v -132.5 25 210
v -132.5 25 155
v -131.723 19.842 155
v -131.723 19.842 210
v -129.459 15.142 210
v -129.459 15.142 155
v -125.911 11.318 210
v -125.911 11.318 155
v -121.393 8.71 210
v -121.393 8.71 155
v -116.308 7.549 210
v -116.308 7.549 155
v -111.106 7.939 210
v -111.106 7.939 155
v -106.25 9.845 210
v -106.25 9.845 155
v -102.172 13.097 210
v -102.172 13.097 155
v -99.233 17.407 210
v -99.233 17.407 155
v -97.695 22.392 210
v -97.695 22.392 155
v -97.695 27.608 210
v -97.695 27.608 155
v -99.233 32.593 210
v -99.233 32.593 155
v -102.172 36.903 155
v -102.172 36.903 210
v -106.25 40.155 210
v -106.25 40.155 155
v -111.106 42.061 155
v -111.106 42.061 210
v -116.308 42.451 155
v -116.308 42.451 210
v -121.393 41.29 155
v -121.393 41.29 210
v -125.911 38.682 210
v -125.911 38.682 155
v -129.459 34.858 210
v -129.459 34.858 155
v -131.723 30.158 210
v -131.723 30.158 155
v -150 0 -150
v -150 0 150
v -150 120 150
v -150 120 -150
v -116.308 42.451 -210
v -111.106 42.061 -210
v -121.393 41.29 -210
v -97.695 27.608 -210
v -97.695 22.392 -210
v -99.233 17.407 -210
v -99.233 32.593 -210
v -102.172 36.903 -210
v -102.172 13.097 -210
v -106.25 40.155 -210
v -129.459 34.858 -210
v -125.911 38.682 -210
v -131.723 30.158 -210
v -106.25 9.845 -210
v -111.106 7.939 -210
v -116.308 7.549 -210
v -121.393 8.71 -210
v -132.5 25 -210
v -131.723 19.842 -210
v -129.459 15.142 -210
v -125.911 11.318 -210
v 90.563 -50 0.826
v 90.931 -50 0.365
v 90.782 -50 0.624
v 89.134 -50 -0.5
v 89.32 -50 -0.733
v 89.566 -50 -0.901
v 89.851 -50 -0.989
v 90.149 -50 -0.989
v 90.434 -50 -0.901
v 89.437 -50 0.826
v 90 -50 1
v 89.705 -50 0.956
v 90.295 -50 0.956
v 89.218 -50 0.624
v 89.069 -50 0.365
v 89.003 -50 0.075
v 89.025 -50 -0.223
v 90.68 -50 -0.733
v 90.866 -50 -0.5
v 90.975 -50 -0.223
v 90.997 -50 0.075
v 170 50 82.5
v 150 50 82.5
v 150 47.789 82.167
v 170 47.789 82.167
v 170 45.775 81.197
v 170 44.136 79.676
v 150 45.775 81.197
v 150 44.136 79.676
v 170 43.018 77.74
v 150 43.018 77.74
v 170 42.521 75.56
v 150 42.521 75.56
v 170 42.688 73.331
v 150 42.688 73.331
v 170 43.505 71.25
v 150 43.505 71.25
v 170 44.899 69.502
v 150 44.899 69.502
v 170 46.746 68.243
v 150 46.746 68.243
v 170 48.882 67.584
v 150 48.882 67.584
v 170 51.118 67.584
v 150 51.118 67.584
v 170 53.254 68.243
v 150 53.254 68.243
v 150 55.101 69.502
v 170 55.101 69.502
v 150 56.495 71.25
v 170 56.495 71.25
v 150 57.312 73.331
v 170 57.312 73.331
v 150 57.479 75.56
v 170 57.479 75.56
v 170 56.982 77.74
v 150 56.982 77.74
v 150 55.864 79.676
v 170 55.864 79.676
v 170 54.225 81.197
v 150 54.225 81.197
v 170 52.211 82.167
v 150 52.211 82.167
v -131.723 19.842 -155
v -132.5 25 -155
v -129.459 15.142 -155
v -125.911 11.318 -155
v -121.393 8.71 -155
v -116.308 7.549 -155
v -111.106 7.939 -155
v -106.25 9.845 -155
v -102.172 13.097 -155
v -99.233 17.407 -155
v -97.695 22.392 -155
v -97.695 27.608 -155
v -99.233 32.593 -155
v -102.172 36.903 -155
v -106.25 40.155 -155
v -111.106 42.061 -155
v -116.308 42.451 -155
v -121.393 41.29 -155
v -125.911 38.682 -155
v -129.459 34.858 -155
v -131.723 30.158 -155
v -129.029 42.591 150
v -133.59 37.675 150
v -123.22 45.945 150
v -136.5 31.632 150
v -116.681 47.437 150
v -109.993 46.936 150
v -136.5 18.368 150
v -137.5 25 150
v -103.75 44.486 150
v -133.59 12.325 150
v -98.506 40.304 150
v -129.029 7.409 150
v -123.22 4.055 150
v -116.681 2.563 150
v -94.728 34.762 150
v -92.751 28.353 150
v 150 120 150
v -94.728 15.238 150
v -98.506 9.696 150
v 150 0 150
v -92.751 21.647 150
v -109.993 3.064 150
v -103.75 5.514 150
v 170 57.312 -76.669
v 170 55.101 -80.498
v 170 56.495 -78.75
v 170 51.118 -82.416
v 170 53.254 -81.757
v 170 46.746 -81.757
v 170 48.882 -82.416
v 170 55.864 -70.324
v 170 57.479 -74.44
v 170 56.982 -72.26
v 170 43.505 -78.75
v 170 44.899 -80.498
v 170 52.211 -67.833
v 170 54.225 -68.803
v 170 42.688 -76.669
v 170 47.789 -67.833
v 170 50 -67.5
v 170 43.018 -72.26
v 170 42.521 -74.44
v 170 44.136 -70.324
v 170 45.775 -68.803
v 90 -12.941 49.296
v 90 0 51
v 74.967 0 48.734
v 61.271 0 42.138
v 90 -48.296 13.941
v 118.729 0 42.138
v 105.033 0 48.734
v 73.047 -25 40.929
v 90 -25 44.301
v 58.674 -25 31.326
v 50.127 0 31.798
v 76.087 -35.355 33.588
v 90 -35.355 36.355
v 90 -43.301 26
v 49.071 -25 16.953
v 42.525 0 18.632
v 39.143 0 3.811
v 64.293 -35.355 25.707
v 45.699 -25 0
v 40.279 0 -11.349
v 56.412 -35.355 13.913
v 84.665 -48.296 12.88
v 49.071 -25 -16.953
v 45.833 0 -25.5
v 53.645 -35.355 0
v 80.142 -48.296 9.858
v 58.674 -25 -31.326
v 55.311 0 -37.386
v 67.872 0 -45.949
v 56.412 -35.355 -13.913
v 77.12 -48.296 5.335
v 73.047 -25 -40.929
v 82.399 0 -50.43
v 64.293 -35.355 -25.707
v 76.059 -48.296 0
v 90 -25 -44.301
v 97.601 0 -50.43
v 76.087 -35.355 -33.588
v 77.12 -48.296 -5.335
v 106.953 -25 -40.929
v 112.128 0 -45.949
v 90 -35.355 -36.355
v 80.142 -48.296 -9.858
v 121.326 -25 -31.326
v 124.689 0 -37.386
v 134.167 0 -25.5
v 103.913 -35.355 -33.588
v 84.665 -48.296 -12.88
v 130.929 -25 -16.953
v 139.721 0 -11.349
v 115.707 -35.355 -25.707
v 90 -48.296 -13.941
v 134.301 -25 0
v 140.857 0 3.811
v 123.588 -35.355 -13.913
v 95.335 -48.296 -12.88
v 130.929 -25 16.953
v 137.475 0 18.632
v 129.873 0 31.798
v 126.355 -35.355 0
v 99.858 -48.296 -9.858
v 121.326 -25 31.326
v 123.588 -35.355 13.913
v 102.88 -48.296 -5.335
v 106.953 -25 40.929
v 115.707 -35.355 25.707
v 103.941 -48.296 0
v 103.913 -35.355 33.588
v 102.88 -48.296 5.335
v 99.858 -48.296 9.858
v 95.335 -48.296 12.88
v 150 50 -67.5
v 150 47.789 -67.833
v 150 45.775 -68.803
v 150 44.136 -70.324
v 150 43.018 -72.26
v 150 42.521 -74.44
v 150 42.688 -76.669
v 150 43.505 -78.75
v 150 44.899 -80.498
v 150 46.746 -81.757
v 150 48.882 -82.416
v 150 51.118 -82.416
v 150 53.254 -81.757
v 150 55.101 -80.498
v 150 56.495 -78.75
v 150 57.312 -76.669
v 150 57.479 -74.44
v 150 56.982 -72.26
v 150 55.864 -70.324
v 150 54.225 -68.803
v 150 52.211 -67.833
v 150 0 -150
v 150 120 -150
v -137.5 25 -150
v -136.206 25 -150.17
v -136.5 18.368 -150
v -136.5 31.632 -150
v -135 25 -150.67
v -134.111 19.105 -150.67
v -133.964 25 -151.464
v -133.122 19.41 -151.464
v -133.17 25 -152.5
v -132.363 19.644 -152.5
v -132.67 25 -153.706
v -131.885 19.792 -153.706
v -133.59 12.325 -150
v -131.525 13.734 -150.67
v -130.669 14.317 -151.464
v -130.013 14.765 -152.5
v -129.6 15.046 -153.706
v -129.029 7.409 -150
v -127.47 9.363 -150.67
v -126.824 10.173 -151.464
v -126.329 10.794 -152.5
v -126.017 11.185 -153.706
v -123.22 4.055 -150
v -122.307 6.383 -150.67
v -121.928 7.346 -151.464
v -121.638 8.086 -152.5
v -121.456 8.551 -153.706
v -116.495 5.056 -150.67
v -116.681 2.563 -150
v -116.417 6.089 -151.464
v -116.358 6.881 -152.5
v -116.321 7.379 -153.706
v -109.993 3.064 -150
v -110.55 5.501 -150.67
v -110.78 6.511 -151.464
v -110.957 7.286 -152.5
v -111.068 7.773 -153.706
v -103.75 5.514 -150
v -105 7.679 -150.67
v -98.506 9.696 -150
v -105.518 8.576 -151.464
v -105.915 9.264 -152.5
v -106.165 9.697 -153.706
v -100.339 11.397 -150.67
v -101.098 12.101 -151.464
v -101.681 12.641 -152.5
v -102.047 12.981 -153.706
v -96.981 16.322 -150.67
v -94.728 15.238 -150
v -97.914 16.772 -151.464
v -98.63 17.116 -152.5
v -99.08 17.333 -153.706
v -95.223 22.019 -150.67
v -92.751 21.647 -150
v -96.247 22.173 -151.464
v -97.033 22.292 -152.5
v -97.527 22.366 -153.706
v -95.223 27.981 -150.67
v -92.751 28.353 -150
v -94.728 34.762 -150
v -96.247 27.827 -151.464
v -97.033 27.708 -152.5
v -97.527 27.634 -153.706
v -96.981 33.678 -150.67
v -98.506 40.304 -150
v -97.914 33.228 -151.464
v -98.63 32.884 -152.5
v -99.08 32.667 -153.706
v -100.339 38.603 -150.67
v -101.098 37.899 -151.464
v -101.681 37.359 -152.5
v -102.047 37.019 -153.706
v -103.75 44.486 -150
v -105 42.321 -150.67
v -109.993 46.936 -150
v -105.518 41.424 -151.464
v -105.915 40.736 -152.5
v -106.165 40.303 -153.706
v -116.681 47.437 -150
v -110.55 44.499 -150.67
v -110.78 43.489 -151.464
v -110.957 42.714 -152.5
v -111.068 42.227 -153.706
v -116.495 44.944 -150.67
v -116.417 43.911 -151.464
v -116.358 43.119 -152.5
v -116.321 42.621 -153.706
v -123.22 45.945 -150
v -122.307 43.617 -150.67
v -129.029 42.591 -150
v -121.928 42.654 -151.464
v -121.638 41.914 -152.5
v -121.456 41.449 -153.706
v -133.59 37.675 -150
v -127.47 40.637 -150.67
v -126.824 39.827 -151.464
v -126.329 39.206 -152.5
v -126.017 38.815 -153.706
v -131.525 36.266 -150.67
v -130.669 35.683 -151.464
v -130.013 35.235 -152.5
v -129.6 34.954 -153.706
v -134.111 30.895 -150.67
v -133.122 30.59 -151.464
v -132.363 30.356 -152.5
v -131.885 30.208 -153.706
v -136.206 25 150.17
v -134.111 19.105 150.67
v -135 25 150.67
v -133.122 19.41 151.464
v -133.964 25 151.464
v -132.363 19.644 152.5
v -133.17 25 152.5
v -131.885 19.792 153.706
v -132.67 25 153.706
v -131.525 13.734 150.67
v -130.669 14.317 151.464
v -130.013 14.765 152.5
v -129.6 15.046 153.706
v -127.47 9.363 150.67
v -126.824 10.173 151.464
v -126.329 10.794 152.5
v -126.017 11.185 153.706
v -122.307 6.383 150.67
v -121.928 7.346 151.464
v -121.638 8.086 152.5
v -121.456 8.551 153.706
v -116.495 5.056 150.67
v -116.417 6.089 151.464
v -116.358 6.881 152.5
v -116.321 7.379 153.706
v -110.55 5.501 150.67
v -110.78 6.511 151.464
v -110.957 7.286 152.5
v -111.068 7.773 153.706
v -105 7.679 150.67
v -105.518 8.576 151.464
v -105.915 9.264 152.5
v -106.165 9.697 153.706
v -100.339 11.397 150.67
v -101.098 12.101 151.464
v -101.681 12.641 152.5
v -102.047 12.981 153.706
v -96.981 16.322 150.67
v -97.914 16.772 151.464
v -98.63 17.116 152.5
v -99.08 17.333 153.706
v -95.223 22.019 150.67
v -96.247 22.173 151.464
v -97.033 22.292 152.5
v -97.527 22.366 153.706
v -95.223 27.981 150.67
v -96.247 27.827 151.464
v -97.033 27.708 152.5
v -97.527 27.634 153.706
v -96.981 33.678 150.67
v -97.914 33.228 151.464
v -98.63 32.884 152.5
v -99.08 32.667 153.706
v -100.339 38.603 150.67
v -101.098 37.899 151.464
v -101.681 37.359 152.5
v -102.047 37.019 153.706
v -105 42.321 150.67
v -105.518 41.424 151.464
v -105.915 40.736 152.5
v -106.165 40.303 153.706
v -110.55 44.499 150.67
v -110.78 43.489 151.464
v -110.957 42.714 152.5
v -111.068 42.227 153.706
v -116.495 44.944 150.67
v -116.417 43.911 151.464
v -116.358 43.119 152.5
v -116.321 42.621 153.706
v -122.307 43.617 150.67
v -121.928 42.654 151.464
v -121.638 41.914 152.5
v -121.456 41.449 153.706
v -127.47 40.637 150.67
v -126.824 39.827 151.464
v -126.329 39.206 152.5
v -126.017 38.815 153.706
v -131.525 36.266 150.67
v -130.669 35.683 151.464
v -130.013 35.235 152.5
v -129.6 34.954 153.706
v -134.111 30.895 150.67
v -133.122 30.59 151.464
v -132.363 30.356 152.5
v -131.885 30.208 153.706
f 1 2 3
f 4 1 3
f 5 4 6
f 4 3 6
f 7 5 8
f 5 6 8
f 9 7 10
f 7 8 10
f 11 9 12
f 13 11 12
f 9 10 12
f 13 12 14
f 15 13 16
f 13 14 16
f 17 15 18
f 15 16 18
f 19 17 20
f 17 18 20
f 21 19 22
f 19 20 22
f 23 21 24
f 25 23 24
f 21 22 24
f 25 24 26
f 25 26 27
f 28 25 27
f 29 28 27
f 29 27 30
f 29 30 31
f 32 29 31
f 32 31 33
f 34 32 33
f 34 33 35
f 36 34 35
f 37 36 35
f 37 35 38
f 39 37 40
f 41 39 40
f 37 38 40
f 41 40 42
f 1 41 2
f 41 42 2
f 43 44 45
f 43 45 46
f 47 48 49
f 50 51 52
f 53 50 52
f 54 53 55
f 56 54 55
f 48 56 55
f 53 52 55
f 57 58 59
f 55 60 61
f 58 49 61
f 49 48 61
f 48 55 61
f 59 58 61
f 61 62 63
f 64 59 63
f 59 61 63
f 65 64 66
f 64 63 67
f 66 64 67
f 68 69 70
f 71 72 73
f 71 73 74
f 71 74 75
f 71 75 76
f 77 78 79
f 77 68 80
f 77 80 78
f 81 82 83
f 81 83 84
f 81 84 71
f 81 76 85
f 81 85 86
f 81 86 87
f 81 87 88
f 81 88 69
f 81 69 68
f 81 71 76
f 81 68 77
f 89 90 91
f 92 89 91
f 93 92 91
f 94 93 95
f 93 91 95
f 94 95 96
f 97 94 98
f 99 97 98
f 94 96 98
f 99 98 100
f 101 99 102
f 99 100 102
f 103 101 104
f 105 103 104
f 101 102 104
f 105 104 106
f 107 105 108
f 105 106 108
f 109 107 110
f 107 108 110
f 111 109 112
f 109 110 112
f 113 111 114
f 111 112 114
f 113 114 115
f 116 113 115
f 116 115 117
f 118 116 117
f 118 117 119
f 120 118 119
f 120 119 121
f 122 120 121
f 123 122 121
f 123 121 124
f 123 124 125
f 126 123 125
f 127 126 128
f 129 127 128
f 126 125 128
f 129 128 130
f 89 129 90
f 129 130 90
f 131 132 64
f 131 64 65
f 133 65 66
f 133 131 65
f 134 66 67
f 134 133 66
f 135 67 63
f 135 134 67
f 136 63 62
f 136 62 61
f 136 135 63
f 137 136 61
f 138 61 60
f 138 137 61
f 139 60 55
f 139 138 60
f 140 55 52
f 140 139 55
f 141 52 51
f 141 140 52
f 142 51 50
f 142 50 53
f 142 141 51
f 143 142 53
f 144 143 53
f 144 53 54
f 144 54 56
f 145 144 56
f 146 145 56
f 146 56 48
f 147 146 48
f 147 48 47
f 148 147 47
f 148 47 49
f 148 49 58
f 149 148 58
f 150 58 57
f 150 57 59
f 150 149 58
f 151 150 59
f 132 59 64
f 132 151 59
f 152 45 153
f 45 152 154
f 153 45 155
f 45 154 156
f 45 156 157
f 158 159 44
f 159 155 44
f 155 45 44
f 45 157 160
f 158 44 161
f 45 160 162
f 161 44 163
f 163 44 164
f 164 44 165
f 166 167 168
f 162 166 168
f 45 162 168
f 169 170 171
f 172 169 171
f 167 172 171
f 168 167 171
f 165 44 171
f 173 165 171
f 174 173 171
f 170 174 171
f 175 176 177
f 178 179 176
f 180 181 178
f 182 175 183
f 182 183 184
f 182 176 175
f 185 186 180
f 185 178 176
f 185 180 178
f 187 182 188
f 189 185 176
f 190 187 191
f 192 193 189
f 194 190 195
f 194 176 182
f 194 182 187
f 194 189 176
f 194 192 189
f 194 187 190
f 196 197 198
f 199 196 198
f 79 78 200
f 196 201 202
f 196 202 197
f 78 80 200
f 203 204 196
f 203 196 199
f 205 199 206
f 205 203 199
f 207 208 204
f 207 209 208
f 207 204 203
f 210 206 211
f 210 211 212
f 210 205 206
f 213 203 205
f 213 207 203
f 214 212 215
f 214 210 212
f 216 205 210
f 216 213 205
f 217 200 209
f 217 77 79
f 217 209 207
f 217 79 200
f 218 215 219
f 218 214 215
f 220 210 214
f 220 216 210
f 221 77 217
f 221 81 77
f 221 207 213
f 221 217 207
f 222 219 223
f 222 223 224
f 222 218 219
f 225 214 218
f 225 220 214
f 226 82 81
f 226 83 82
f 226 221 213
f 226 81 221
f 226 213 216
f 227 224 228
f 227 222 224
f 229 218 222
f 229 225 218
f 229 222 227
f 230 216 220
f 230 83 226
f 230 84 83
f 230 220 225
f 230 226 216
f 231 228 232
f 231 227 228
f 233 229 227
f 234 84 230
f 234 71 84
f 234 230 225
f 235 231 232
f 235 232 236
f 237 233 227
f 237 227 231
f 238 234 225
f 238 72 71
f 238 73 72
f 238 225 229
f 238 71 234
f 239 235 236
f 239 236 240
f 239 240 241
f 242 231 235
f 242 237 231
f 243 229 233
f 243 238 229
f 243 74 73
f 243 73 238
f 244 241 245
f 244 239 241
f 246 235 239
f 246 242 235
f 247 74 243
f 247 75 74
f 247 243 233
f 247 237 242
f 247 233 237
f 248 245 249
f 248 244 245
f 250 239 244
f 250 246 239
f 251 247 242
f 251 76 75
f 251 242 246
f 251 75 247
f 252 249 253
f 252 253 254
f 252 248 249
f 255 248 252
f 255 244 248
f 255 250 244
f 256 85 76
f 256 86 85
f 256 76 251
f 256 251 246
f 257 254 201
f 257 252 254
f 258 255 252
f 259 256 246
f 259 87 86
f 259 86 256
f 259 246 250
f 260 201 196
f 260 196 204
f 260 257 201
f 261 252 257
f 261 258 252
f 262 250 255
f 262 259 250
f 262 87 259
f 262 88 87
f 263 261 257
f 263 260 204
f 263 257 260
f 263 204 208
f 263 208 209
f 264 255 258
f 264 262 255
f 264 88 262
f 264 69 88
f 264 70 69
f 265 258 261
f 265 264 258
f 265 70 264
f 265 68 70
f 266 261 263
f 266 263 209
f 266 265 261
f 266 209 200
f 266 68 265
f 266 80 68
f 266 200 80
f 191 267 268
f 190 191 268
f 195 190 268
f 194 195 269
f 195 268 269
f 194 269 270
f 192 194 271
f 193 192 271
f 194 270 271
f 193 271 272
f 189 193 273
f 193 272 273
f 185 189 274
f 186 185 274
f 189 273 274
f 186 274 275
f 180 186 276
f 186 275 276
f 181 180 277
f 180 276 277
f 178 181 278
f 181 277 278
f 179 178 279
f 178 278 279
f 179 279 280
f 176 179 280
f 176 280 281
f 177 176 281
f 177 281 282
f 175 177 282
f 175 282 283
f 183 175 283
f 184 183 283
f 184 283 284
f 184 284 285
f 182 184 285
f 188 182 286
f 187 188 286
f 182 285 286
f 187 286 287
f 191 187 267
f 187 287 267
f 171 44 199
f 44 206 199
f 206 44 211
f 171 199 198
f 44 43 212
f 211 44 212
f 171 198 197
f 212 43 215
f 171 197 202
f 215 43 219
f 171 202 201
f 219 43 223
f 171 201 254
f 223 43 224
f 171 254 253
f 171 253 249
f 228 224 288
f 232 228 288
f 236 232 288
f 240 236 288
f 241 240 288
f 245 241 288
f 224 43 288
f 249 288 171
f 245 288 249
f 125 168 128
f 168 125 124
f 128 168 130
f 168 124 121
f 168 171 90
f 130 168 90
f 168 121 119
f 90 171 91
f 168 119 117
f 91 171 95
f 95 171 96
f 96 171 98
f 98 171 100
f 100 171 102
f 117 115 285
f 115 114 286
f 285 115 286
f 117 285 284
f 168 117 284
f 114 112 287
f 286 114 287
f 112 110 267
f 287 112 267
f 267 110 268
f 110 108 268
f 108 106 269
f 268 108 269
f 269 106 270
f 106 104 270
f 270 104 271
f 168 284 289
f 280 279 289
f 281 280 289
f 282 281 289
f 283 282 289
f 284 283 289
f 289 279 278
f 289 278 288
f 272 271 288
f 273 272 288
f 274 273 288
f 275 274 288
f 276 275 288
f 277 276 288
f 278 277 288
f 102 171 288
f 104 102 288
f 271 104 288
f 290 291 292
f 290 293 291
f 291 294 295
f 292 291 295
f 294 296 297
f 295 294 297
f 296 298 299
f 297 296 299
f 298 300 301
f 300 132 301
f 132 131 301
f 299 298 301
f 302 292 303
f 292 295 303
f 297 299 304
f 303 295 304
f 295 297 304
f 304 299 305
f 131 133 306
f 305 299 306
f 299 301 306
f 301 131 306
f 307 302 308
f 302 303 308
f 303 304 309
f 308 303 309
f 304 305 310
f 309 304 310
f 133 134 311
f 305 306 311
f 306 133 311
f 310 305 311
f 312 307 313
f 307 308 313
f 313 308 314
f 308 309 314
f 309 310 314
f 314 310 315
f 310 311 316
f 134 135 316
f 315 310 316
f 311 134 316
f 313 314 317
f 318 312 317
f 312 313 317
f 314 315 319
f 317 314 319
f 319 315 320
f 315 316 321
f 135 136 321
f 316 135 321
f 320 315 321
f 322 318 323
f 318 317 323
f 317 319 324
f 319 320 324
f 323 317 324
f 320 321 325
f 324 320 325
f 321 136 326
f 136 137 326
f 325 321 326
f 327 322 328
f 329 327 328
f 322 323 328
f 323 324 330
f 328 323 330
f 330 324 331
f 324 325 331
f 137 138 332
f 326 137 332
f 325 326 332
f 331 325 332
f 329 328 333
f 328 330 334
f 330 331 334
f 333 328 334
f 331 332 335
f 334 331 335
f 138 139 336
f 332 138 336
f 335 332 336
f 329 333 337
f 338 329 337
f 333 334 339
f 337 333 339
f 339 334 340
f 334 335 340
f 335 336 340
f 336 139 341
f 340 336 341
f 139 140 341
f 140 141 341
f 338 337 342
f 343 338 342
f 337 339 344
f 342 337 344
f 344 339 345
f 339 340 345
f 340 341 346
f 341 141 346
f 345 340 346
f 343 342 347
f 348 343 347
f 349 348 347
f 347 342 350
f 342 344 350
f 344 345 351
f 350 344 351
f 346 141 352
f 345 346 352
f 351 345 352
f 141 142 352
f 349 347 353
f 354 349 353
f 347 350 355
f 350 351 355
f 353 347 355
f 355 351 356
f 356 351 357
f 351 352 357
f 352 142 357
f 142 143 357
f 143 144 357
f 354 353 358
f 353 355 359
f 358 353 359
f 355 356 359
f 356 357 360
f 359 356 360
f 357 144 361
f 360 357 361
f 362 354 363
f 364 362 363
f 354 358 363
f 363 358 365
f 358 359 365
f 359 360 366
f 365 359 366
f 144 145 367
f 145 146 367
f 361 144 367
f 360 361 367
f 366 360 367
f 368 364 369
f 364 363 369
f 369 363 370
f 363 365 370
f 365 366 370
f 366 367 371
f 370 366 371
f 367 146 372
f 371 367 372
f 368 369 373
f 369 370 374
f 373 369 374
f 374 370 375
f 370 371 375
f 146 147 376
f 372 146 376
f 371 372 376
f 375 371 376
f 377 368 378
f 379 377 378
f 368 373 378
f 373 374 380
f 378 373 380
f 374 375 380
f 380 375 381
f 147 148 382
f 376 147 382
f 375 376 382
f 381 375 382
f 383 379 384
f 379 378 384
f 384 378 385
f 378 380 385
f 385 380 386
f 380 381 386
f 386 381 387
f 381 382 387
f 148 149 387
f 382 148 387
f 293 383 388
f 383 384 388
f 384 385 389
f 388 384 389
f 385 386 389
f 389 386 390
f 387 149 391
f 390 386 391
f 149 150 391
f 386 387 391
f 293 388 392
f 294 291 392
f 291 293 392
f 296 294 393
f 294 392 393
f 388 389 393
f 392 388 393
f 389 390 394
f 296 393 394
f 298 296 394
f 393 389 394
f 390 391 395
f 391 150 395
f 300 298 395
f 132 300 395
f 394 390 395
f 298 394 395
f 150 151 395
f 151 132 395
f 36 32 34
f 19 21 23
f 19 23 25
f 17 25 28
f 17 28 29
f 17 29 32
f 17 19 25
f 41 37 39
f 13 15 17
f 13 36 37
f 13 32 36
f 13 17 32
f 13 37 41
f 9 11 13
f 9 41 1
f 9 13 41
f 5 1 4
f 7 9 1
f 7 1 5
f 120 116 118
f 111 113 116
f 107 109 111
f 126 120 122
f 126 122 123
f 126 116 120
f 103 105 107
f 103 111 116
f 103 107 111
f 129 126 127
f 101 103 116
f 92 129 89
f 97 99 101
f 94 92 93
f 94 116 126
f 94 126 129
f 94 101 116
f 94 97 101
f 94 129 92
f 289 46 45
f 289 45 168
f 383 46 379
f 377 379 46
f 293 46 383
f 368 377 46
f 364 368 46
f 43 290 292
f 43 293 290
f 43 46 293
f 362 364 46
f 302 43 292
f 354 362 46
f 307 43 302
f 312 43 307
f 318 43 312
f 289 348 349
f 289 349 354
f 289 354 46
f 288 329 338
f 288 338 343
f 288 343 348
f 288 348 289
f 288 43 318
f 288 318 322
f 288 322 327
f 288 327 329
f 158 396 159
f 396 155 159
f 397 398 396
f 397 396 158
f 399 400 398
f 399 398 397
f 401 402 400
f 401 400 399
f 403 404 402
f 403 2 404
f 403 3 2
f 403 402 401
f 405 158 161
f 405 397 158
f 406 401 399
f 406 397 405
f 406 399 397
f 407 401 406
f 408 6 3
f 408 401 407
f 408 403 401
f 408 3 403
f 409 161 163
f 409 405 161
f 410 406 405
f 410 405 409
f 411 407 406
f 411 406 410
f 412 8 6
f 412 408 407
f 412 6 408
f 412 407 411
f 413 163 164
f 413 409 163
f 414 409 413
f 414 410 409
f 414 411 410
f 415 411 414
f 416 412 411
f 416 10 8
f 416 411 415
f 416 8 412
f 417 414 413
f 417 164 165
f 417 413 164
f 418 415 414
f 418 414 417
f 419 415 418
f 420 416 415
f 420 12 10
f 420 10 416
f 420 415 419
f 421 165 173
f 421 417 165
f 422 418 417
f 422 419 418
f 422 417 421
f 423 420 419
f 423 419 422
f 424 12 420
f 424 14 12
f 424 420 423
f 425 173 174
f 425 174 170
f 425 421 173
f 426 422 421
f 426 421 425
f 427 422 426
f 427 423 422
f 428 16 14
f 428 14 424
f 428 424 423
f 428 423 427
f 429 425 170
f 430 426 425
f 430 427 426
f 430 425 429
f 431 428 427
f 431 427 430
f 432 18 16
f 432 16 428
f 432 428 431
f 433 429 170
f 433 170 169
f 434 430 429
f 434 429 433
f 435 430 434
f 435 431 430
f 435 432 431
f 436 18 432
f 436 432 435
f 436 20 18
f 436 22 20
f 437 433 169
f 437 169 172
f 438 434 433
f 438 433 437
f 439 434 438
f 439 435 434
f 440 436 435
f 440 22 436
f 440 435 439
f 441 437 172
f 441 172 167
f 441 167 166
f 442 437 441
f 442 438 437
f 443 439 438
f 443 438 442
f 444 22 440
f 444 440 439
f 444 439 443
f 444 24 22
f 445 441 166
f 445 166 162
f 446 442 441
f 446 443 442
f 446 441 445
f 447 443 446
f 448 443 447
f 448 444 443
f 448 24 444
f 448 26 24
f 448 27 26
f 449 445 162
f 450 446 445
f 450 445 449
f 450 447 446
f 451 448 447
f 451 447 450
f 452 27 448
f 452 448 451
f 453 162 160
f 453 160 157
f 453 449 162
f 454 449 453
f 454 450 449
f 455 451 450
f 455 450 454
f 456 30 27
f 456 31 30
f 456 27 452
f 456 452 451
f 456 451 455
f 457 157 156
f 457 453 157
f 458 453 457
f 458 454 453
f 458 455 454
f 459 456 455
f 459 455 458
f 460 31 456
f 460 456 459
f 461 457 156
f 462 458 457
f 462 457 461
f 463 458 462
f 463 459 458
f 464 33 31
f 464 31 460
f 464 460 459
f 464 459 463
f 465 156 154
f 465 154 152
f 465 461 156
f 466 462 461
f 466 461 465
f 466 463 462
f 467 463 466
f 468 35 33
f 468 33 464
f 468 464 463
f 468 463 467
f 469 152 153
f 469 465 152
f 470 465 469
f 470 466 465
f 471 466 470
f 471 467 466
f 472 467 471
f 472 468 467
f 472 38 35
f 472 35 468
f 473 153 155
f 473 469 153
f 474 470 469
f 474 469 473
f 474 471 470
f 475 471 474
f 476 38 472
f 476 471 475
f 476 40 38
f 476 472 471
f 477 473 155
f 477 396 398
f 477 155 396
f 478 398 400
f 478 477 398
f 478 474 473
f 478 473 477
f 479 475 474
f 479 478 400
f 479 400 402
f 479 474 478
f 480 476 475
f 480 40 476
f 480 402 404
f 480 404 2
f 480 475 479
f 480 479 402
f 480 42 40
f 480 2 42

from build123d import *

# Parameters (mm, degrees)
SKETCH1_W           = 300
SKETCH1_H           = 300
BOSS_EXTRUDE1_DEPTH = 120
SKETCH3_R           = 17.5
BOSS_EXTRUDE3_DEPTH = 60
FILLET1_R           = 5
SKETCH4_R           = 51
BOSS_EXTRUDE4_DEPTH = 50
FILLET2_R           = 50
SKETCH6_R           = 7.5
BOSS_EXTRUDE5_DEPTH = 20


with BuildPart() as part:
    # Sketch1 → Boss-Extrude1 (new body)
    with BuildSketch(Plane(origin=(0, 0, 0), x_dir=(1, 0, 0), z_dir=(0, 1, 0))):
        Rectangle(SKETCH1_W, SKETCH1_H)
    extrude(amount=BOSS_EXTRUDE1_DEPTH)

    # Sketch3 → Boss-Extrude3 (add)
    with BuildSketch(Plane.XY.offset(150)):
        with Locations(Location((-115, 25, 0), (0, 0, 180))):
            Circle(SKETCH3_R)
    boss_extrude3 = extrude(amount=BOSS_EXTRUDE3_DEPTH)

    # Mirror1: Boss-Extrude3 across plane
    add(boss_extrude3.mirror(Plane.XY))

    # Fillet1
    fillet1_edges = [part.edges().sort_by_distance(p)[0] for p in [
        (-97.5, 25, 150),
        (-97.5, 25, -150),
    ]]
    fillet(fillet1_edges, radius=FILLET1_R)

    # Sketch4 → Boss-Extrude4 (add)
    with BuildSketch(Plane.XZ):
        with Locations(Location((90, 0, 0), (0, 0, 90))):
            Circle(SKETCH4_R)
    extrude(amount=BOSS_EXTRUDE4_DEPTH)

    # Fillet2
    fillet2_edges = [part.edges().sort_by_distance(p)[0] for p in [
        (90, -50, -51),
    ]]
    fillet(fillet2_edges, radius=FILLET2_R - 0.0001)  # a hair under: the kernel refuses the full size

    # Sketch6 → Boss-Extrude5 (add)
    with BuildSketch(Plane(origin=(150, 0, 0), x_dir=(0, 0, -1), z_dir=(1, 0, 0))):
        with Locations(Location((-75, 50, 0), (0, 0, 180))):
            Circle(SKETCH6_R)
        with Locations(Location((75, 50, 0), (0, 0, 180))):
            Circle(SKETCH6_R)
    extrude(amount=BOSS_EXTRUDE5_DEPTH)


solid = part.part
